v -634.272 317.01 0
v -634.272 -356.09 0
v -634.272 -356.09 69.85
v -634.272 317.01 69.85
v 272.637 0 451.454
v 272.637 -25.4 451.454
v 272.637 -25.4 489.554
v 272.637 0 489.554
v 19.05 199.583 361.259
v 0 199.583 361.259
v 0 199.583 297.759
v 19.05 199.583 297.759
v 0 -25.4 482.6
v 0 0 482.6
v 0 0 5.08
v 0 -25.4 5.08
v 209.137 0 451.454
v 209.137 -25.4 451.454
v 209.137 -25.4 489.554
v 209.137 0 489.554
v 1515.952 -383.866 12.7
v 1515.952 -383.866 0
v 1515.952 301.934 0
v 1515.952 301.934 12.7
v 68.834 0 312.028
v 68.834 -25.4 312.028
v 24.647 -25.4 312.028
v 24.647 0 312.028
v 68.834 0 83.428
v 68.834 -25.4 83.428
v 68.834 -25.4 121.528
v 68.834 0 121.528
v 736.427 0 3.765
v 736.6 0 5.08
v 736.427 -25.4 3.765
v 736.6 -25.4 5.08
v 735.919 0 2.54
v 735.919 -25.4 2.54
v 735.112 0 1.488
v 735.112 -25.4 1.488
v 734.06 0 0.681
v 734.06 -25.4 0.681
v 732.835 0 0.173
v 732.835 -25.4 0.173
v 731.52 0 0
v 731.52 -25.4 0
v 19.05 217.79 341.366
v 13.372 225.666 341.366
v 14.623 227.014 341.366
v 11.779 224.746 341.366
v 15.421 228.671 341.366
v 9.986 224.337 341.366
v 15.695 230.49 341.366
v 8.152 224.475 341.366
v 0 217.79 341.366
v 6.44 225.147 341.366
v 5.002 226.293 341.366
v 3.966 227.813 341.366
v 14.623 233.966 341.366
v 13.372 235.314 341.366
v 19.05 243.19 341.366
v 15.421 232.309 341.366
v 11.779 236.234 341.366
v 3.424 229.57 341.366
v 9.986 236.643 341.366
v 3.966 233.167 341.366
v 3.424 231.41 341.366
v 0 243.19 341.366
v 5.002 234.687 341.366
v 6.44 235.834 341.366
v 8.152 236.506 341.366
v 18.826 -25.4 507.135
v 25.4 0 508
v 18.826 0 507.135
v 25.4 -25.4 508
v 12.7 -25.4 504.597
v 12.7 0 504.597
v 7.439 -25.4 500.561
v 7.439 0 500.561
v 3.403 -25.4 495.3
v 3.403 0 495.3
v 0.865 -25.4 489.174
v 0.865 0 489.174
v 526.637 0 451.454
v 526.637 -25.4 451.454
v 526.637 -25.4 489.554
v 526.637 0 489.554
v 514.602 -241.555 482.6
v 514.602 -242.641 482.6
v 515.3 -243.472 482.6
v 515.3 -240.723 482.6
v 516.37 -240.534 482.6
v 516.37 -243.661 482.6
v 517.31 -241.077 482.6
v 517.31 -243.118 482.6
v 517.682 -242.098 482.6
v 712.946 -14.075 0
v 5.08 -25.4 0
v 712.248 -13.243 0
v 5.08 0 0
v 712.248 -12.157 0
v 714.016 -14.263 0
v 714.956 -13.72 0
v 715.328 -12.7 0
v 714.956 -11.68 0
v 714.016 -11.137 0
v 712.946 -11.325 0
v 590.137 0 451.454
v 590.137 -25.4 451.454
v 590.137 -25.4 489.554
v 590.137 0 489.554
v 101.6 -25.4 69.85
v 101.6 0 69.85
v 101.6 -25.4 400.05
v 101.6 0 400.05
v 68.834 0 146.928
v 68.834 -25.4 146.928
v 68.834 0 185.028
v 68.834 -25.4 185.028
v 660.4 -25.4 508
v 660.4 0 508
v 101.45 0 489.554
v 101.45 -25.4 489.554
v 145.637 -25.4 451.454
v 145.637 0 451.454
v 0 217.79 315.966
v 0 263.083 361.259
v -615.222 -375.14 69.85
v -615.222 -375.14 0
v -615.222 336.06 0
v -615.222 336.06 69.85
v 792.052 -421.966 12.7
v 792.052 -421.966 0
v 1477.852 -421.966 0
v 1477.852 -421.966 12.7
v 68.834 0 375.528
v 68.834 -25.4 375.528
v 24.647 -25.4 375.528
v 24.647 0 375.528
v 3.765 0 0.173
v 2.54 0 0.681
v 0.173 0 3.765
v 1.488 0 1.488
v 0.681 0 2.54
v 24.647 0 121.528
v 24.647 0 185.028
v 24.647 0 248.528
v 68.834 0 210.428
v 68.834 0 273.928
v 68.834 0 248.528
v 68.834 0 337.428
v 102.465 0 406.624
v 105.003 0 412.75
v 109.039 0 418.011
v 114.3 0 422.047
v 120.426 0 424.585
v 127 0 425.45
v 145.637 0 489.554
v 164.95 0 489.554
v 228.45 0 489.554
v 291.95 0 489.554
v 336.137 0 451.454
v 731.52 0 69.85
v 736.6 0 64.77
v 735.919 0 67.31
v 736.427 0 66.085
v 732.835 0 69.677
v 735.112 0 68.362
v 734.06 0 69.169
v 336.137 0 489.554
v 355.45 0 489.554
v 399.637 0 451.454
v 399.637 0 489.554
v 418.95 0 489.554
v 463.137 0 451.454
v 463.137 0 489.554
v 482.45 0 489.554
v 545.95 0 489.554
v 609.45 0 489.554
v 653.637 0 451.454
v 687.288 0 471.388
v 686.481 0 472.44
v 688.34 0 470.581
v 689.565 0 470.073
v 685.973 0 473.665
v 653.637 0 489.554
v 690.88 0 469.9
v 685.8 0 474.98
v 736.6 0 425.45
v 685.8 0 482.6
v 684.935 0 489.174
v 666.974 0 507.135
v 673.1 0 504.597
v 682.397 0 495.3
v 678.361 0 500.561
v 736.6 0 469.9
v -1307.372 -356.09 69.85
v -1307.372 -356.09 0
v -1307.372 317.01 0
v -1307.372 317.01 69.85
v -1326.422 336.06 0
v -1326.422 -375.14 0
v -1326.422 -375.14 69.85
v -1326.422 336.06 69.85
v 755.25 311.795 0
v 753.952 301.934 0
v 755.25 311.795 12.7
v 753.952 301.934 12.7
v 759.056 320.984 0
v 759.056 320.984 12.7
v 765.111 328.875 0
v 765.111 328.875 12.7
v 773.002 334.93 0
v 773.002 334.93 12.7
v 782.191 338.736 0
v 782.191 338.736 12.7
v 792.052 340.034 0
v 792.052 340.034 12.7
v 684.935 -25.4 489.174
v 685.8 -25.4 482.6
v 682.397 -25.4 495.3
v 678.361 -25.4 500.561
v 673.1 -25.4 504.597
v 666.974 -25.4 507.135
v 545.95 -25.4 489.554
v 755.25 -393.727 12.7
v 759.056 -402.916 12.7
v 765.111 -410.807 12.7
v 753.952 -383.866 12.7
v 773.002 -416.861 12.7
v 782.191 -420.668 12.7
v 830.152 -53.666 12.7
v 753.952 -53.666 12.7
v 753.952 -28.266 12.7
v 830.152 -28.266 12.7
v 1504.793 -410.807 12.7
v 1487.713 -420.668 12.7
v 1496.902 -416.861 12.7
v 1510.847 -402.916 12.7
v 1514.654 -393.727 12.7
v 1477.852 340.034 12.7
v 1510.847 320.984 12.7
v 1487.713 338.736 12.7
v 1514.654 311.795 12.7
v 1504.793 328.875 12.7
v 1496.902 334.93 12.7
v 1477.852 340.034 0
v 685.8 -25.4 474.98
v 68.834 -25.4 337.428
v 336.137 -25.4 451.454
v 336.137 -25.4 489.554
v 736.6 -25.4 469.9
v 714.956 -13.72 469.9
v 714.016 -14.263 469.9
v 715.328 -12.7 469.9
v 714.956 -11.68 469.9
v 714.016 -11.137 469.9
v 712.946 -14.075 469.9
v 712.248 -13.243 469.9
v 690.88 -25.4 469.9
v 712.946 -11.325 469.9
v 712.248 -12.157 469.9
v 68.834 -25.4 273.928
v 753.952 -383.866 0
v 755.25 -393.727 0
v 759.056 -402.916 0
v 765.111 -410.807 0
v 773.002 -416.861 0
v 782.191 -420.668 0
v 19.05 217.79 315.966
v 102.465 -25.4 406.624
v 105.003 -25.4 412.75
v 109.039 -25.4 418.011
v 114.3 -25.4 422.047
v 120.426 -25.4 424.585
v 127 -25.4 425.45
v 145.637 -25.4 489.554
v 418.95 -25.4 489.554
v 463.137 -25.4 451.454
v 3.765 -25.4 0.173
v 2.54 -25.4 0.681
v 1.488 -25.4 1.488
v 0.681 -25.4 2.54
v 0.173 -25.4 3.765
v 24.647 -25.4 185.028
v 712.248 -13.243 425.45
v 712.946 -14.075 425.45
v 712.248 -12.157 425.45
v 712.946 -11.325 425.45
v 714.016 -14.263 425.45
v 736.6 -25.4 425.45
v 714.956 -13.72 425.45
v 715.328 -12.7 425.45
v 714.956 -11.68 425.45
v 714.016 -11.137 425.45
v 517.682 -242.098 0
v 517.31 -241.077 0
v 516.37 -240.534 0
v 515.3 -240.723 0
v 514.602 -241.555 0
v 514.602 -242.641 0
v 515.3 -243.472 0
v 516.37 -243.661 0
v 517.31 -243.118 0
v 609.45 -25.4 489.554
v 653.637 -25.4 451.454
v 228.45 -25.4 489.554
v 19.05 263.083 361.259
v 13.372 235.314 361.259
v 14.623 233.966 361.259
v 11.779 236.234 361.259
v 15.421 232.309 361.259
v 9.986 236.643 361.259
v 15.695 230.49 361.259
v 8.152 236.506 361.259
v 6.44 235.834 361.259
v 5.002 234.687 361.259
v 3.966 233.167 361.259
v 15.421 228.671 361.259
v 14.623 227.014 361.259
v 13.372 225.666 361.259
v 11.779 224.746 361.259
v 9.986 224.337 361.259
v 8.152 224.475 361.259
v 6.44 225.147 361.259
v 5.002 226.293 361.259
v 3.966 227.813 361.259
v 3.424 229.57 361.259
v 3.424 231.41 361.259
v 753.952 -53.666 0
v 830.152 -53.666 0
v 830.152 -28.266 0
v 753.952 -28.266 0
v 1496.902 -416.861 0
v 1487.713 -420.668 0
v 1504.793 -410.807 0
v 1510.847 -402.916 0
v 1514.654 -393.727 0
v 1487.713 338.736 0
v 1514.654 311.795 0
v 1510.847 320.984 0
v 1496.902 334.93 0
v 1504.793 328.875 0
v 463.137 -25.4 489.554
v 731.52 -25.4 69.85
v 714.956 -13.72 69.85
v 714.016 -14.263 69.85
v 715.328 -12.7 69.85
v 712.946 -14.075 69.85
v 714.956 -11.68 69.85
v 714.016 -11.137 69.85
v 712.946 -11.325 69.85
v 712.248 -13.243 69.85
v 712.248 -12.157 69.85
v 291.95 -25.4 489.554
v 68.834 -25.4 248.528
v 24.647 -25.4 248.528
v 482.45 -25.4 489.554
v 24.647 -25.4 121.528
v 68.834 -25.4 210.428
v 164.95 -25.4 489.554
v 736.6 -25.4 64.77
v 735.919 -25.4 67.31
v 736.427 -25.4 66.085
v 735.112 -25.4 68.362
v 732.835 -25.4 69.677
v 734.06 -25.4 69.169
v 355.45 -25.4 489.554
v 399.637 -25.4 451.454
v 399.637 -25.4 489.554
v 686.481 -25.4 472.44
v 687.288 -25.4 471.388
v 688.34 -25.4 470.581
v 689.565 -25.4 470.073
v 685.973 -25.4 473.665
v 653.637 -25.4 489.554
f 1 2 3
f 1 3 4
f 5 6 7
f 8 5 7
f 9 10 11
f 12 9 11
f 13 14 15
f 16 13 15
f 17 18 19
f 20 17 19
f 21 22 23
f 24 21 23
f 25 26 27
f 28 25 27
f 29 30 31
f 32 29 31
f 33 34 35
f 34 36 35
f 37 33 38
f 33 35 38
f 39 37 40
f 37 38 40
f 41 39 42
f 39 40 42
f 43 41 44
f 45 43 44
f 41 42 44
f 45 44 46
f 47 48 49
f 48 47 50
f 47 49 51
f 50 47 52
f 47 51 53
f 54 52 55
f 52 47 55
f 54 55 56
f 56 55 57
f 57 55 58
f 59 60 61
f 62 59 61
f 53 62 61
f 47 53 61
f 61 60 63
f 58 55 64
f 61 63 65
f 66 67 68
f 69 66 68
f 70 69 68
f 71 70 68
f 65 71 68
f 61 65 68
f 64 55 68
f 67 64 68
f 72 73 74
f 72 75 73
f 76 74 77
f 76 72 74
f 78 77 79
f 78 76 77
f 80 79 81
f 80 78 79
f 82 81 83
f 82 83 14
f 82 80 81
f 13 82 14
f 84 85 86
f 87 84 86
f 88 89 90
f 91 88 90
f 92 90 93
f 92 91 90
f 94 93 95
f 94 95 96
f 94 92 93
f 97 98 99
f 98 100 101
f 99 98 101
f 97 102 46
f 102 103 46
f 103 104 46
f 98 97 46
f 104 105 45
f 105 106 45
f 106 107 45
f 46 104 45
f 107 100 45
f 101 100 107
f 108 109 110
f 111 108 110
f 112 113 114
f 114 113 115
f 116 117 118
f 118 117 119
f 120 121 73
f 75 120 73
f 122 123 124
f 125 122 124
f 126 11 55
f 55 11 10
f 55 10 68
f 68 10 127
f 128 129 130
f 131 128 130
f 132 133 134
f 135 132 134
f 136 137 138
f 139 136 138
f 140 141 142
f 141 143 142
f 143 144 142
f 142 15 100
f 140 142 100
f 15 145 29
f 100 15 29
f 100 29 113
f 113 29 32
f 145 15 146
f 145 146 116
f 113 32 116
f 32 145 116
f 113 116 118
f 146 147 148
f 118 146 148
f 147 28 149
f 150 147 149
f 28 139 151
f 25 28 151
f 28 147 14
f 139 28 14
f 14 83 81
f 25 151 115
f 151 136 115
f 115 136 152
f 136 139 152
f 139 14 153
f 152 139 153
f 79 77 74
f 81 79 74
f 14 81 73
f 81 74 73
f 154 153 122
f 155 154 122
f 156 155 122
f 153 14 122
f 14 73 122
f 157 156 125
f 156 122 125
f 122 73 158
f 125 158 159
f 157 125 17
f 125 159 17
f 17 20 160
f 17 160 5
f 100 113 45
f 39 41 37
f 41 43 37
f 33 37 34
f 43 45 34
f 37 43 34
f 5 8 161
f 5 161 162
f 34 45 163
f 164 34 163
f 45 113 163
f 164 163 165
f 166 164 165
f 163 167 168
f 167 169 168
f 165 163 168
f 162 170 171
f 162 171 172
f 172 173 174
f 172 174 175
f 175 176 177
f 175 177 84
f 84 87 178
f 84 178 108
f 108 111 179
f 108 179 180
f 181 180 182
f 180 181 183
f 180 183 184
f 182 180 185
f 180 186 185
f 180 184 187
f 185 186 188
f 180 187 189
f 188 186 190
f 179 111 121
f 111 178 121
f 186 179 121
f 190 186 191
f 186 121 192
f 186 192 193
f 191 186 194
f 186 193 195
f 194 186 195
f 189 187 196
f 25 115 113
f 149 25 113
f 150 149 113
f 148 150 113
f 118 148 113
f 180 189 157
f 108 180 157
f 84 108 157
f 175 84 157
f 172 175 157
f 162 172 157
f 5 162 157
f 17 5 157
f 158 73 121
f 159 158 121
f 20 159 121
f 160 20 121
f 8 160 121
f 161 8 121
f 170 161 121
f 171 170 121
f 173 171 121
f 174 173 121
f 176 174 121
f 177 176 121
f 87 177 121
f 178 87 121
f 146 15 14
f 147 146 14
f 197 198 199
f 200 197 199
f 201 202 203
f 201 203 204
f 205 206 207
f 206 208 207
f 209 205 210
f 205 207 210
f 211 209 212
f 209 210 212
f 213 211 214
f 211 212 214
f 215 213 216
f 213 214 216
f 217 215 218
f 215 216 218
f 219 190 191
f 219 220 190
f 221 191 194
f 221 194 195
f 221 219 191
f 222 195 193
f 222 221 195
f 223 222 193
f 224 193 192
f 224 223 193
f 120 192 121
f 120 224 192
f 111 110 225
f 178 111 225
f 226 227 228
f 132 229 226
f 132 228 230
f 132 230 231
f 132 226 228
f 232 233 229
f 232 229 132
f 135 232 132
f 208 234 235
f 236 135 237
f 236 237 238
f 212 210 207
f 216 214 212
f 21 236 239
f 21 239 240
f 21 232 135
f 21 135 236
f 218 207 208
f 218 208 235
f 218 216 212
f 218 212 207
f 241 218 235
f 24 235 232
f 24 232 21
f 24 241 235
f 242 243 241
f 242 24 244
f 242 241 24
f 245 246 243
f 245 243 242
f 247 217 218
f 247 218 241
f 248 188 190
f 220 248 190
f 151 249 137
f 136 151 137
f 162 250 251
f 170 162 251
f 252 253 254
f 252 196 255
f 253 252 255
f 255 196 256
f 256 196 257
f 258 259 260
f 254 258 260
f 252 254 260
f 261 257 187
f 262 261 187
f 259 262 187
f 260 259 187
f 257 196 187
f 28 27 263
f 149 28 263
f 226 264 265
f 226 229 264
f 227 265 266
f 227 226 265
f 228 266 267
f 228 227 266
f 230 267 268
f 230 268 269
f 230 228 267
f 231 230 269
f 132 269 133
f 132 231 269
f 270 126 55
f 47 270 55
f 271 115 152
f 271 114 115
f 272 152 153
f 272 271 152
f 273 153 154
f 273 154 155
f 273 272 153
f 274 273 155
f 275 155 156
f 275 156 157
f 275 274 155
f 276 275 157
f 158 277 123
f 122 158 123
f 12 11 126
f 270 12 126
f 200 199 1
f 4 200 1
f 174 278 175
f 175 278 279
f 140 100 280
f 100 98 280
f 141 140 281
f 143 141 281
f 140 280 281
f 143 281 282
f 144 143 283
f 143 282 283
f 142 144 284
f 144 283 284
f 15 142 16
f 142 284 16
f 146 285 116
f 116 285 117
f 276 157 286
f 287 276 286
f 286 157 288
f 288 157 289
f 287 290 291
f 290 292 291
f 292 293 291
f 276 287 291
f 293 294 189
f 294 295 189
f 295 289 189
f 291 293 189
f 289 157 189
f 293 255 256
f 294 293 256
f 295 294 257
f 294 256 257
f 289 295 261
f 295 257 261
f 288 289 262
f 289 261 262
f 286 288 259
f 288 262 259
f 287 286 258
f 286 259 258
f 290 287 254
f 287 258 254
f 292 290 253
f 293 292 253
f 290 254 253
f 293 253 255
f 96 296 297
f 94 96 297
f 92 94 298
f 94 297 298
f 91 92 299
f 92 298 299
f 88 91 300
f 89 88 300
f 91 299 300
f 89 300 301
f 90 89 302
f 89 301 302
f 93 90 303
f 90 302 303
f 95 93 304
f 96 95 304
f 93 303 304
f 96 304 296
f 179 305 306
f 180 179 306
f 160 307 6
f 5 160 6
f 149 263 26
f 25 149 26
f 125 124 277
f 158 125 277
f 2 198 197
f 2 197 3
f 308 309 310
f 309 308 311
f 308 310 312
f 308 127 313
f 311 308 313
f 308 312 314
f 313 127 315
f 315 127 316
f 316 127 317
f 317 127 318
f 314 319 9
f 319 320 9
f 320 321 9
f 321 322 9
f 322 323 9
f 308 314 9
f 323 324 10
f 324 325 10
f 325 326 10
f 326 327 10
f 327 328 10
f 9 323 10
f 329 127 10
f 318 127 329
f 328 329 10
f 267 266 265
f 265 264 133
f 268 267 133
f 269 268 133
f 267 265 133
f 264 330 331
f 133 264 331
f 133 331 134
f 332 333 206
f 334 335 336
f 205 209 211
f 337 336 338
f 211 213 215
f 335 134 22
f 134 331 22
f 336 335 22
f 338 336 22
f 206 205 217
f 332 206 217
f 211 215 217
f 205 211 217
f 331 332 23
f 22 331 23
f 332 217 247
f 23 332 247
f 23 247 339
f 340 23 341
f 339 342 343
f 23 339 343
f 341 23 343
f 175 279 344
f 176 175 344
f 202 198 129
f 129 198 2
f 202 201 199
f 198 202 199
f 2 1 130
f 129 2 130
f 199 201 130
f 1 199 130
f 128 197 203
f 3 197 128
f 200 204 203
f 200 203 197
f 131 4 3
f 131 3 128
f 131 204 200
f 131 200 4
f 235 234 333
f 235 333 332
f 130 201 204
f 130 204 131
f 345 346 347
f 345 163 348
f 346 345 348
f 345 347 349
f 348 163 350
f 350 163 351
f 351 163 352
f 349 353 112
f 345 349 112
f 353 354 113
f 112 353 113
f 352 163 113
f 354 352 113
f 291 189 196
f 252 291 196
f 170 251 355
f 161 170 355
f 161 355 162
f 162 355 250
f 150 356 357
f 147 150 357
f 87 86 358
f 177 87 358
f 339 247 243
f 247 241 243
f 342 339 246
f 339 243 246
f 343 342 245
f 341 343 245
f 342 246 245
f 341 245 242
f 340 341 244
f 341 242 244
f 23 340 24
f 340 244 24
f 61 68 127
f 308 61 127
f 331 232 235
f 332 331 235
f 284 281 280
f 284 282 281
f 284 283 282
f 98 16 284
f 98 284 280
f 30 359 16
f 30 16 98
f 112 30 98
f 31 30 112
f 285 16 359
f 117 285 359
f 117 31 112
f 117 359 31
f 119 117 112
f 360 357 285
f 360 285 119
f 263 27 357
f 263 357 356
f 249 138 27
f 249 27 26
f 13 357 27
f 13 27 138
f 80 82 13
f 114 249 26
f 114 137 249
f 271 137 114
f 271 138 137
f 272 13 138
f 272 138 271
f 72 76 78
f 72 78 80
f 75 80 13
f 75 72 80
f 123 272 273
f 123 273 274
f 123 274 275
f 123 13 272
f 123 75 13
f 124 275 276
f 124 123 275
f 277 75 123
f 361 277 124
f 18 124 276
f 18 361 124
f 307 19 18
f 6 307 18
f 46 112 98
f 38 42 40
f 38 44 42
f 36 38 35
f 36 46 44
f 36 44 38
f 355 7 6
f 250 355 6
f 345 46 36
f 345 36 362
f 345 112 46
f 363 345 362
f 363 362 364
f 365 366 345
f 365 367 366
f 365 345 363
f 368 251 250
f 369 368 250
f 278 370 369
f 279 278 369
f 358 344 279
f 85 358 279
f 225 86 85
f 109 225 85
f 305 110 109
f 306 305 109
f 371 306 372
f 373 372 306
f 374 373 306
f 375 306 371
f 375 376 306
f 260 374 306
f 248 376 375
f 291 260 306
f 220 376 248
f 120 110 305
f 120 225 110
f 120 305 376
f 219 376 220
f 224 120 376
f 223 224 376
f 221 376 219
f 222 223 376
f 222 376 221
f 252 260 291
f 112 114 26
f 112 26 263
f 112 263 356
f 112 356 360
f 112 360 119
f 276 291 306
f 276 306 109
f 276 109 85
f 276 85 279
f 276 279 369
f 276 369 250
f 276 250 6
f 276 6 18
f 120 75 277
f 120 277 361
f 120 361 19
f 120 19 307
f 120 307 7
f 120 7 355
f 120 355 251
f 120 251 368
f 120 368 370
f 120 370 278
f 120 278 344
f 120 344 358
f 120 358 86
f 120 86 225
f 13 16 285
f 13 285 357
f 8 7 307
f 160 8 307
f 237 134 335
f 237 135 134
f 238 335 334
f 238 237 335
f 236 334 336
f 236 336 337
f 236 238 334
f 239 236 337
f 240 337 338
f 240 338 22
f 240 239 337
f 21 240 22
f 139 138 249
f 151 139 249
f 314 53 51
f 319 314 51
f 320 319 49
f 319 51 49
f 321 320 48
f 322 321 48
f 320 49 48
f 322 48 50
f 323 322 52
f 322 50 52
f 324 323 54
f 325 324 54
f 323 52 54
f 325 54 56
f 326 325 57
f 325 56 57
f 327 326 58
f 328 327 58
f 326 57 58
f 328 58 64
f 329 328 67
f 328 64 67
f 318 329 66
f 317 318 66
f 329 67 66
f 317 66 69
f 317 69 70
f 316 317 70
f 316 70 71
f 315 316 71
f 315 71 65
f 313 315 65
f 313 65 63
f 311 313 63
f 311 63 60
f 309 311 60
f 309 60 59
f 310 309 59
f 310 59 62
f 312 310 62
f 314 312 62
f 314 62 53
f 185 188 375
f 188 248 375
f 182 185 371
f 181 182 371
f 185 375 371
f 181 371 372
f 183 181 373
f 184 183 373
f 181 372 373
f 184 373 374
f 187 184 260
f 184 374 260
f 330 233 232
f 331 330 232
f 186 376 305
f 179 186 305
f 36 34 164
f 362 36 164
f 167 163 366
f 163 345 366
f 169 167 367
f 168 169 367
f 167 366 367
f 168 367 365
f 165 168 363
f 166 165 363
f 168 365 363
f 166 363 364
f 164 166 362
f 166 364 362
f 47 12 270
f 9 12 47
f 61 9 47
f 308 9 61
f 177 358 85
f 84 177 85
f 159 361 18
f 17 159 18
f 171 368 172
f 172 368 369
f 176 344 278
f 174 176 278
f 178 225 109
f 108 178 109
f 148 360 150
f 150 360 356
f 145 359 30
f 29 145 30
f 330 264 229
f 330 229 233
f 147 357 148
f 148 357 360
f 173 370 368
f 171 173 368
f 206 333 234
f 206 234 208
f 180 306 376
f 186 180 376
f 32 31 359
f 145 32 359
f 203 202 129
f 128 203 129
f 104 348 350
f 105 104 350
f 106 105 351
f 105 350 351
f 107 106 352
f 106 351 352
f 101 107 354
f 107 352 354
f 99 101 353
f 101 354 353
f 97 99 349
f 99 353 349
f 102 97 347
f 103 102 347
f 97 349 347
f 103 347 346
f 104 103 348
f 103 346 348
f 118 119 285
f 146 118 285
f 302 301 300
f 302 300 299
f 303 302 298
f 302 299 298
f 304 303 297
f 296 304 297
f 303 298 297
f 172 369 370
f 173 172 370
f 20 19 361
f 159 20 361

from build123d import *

# Parameters (mm, degrees)
F1_DEPTH  = 25.4
F2_R      = 25.4
F3_R      = 5.08
F4_R      = 25.4
F5_R      = 25.4
F6_R      = 5.08
F7_R      = 5.08
F9_DEPTH  = 25.401
F10_W     = 762
F10_H     = 762
F11_DEPTH = 12.7
F12_W     = 711.2
F12_H     = 711.2
F12_W_2   = 673.1
F12_H_2   = 673.1
F13_DEPTH = 69.85
F14_W     = 76.2
F14_H     = 25.4
F15_DEPTH = 25.4
F16_R     = 1.5875
F17_DEPTH = 469.901
F18_R     = 1.5875
F19_DEPTH = 482.6
F20_R     = 38.1
F22_DEPTH = 19.05
F23_R     = 6.170187
F24_DEPTH = 25.4


with BuildPart() as f1:
    # F0 (on Front) → F1 (new body)
    with BuildSketch(Plane.XZ):
        Polygon((0, 508), (0, 0), (736.6, 0), (736.6, 69.85), (101.6, 69.85), (101.6, 425.45), (736.6, 425.45), (736.6, 469.9), (685.8, 469.9), (685.8, 508), align=None)
    extrude(amount=F1_DEPTH)

    # F2
    f2_edges = [f1.edges().sort_by_distance(p)[0] for p in [
        (685.8, -12.7, 508),
    ]]
    fillet(f2_edges, radius=F2_R)

    # F3
    f3_edges = [f1.edges().sort_by_distance(p)[0] for p in [
        (685.8, -12.7, 469.9),
    ]]
    fillet(f3_edges, radius=F3_R)

    # F4
    f4_edges = [f1.edges().sort_by_distance(p)[0] for p in [
        (0, -12.7, 508),
    ]]
    fillet(f4_edges, radius=F4_R)

    # F5
    f5_edges = [f1.edges().sort_by_distance(p)[0] for p in [
        (101.6, -12.7, 425.45),
    ]]
    fillet(f5_edges, radius=F5_R)

    # F6
    f6_edges = [f1.edges().sort_by_distance(p)[0] for p in [
        (736.6, -12.7, 0),
        (736.6, -12.7, 69.85),
    ]]
    fillet(f6_edges, radius=F6_R)

    # F7
    f7_edges = [f1.edges().sort_by_distance(p)[0] for p in [
        (0, -12.7, 0),
    ]]
    fillet(f7_edges, radius=F7_R)

    # F8 (on face) → F9 (cut, through all)
    with BuildSketch(Plane.XZ.offset(25.4)):
        Polygon((145.637189, 451.454478), (145.637189, 489.554478), (101.450458, 489.554478), align=None)
        Polygon((209.137189, 451.454478), (209.137189, 489.554478), (164.950458, 489.554478), align=None)
        Polygon((272.637189, 451.454478), (272.637189, 489.554478), (228.450458, 489.554478), align=None)
        Polygon((336.137189, 451.454478), (336.137189, 489.554478), (291.950458, 489.554478), align=None)
        Polygon((399.637189, 451.454478), (399.637189, 489.554478), (355.450458, 489.554478), align=None)
        Polygon((463.137189, 451.454478), (463.137189, 489.554478), (418.950458, 489.554478), align=None)
        Polygon((526.637189, 451.454478), (526.637189, 489.554478), (482.450458, 489.554478), align=None)
        Polygon((653.637189, 451.454478), (653.637189, 489.554478), (609.450458, 489.554478), align=None)
        Polygon((590.137189, 451.454478), (590.137189, 489.554478), (545.950458, 489.554478), align=None)
        Polygon((68.834218, 337.42751), (68.834218, 375.52751), (24.647487, 375.52751), align=None)
        Polygon((24.647487, 312.02751), (68.834218, 273.92751), (68.834218, 312.02751), align=None)
        Polygon((24.647487, 248.52751), (68.834218, 210.42751), (68.834218, 248.52751), align=None)
        Polygon((24.647487, 185.02751), (68.834218, 146.92751), (68.834218, 185.02751), align=None)
        Polygon((24.647487, 121.52751), (68.834218, 83.42751), (68.834218, 121.52751), align=None)
    extrude(amount=-F9_DEPTH, mode=Mode.SUBTRACT)

    # F16 (on face) → F17 (cut, through all)
    with BuildSketch(Plane.XY.offset(469.9)):
        with Locations((713.74, -12.7)):
            Circle(F16_R)
    extrude(amount=-F17_DEPTH, mode=Mode.SUBTRACT)


with BuildPart() as f11:
    # F10 (on Top) → F11 (new body)
    with BuildSketch(Plane.XY):
        with Locations((1134.951833, -40.96593)):
            Rectangle(F10_W, F10_H)
    extrude(amount=F11_DEPTH)

    # F14 (on face) → F15 (cut)
    with BuildSketch(Plane.XY.offset(12.7)):
        with Locations((792.051833, -40.96593)):
            Rectangle(F14_W, F14_H)
    extrude(amount=-F15_DEPTH, mode=Mode.SUBTRACT)

    # F20
    f20_edges = [f11.edges().sort_by_distance(p)[0] for p in [
        (1515.951833, -421.96593, 6.35),
        (753.951833, -421.96593, 6.35),
        (1515.951833, 340.03407, 6.35),
        (753.951833, 340.03407, 6.35),
    ]]
    fillet(f20_edges, radius=F20_R)


with BuildPart() as f13:
    # F12 (on Top) → F13 (new body)
    with BuildSketch(Plane.XY):
        with Locations((-970.822424, -19.539969)):
            Rectangle(F12_W, F12_H)
        with Locations((-970.822424, -19.539969)):
            Rectangle(F12_W_2, F12_H_2, mode=Mode.SUBTRACT)
    extrude(amount=F13_DEPTH)


with BuildPart() as f19:
    # F18 (on Top) → F19 (new body)
    with BuildSketch(Plane.XY):
        with Locations((516.094208, -242.097676)):
            Circle(F18_R)
    extrude(amount=F19_DEPTH)


with BuildPart() as f22:
    # F21 (on Right) → F22 (new body)
    with BuildSketch(Plane.YZ):
        Polygon((243.190112, 341.366081), (263.08307, 361.259038), (199.58307, 361.259038), (199.58307, 297.759038), (217.790112, 315.966081), (217.790112, 341.366081), align=None)
    extrude(amount=F22_DEPTH)

    # F23 (on face) → F24 (cut)
    with BuildSketch(Plane(origin=(0, 0, 341.366081), x_dir=(1, 0, 0), z_dir=(0, 0, -1))):
        with Locations((9.525, -230.490112)):
            Circle(F23_R)
    extrude(amount=-F24_DEPTH, mode=Mode.SUBTRACT)


solid = Compound([f1.part, f11.part, f13.part, f19.part, f22.part])
